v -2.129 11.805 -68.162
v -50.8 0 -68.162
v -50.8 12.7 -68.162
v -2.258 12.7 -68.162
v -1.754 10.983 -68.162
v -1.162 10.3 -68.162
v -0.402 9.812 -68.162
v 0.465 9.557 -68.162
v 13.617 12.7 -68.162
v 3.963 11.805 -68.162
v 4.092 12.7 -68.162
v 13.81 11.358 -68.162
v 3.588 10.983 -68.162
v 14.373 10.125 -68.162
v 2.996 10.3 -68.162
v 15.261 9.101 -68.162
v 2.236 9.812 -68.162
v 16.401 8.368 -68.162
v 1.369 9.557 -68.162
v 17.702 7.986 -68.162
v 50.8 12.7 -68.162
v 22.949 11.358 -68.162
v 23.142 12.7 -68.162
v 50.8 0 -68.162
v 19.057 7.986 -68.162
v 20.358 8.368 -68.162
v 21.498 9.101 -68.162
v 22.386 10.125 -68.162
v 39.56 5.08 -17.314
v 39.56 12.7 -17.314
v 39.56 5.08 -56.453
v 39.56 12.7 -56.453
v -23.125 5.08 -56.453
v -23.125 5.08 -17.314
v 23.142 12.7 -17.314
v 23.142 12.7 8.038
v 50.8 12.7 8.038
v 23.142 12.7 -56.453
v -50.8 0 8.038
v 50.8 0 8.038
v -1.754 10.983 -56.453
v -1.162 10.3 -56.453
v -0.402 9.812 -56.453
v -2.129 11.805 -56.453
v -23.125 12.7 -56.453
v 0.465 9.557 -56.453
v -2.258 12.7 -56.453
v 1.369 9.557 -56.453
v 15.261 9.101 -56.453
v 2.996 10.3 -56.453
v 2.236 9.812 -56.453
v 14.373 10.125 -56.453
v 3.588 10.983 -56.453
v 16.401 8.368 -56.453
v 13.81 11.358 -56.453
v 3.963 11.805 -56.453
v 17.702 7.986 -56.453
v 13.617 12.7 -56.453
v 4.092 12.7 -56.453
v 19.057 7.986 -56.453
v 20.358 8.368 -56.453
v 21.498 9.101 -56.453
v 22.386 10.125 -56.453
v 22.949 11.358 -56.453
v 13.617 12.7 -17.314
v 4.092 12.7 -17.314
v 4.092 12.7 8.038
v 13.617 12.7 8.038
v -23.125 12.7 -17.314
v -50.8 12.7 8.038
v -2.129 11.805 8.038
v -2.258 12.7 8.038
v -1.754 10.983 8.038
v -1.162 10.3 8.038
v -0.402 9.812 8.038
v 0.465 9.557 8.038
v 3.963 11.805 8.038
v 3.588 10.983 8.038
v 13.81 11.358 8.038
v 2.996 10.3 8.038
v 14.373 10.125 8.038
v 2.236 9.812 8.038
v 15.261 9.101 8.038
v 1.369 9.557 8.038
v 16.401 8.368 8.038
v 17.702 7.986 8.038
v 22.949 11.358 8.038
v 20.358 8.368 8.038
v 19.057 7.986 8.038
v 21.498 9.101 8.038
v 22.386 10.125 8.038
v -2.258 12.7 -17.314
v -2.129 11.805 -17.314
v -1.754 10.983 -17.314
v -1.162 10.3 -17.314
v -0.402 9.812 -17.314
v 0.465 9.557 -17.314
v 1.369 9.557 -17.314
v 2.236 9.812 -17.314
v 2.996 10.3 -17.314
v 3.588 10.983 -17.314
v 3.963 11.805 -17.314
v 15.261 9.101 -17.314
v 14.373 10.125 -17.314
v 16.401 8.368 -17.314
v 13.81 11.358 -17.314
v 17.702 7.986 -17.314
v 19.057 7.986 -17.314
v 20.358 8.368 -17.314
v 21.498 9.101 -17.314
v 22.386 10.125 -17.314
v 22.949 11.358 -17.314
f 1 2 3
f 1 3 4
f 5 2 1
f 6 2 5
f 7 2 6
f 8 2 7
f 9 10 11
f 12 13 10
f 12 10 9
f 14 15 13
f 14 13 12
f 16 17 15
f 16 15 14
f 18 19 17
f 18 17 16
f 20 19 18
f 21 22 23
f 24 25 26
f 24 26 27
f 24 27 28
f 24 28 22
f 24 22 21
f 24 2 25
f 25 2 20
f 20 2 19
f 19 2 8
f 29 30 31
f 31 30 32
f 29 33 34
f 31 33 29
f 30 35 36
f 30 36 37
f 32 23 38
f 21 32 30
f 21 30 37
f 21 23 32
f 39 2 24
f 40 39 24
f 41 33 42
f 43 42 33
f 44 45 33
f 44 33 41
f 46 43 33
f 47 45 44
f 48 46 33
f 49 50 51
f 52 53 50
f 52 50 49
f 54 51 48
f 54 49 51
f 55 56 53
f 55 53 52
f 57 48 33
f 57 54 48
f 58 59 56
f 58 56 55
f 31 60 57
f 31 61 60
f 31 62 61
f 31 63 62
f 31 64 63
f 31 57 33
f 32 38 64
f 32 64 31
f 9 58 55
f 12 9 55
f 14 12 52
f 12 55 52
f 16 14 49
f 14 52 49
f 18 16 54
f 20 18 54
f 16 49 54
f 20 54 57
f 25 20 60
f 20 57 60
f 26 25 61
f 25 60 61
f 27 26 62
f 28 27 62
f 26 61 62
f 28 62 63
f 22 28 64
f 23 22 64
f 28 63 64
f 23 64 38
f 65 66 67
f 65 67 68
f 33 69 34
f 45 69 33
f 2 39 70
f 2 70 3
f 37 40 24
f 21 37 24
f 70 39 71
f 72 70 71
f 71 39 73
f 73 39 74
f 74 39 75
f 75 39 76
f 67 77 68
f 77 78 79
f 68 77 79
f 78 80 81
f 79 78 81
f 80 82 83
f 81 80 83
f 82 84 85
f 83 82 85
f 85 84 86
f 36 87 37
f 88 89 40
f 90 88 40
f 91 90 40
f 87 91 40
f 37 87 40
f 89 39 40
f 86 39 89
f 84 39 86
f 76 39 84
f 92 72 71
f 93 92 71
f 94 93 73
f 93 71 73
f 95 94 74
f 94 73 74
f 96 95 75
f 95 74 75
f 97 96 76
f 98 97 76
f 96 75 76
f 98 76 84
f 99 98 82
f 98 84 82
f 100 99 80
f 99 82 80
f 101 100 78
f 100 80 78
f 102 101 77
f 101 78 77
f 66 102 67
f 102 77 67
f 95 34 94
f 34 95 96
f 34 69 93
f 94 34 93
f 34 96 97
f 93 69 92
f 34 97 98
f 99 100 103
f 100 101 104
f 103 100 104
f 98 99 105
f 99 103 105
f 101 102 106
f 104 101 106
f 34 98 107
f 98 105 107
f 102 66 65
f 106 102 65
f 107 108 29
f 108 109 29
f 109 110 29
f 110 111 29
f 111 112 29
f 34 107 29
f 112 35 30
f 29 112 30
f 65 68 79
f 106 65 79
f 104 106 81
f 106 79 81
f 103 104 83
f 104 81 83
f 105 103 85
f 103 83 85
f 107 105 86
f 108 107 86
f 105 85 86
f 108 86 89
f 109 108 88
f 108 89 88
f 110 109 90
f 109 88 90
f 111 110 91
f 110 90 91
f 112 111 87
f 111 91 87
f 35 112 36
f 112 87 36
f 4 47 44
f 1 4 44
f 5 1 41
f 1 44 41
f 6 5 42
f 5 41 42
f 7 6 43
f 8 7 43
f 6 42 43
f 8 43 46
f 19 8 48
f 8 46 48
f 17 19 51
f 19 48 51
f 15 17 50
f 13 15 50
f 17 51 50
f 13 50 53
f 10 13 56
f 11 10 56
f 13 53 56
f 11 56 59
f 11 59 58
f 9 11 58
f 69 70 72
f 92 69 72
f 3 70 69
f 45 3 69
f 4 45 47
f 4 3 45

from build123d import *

# Parameters (mm, degrees)
SKETCH1_W           = 101.6
SKETCH1_H           = 76.2
BOSS_EXTRUDE1_DEPTH = 12.7
SKETCH4_W           = 62.685063192
SKETCH4_H           = 39.138657103
CUT_EXTRUDE2_DEPTH  = 7.62
SKETCH5_R           = 3.175
SKETCH5_R_2         = 4.7625
CUT_EXTRUDE3_DEPTH  = 93.457395594


with BuildPart() as part:
    # Sketch1 → Boss-Extrude1 (new body)
    with BuildSketch(Plane(origin=(0, 0, 0), x_dir=(1, 0, 0), z_dir=(0, 1, 0))):
        with Locations((0, 30.062025316)):
            Rectangle(SKETCH1_W, SKETCH1_H)
    extrude(amount=BOSS_EXTRUDE1_DEPTH)

    # Sketch4 → Cut-Extrude2 (cut)
    with BuildSketch(Plane(origin=(0, 12.7, 0), x_dir=(1, 0, 0), z_dir=(0, 1, 0))):
        with Locations((8.217537696, 36.883635135)):
            Rectangle(SKETCH4_W, SKETCH4_H)
    extrude(amount=-CUT_EXTRUDE2_DEPTH, mode=Mode.SUBTRACT)

    # Sketch5 → Cut-Extrude3 (cut, through all)
    with BuildSketch(Plane.XY.offset(8.037974684)):
        with Locations((0.917080185, 12.7)):
            Circle(SKETCH5_R)
        with Locations((18.379580185, 12.7)):
            Circle(SKETCH5_R_2)
    extrude(amount=-CUT_EXTRUDE3_DEPTH, mode=Mode.SUBTRACT)


solid = part.part
